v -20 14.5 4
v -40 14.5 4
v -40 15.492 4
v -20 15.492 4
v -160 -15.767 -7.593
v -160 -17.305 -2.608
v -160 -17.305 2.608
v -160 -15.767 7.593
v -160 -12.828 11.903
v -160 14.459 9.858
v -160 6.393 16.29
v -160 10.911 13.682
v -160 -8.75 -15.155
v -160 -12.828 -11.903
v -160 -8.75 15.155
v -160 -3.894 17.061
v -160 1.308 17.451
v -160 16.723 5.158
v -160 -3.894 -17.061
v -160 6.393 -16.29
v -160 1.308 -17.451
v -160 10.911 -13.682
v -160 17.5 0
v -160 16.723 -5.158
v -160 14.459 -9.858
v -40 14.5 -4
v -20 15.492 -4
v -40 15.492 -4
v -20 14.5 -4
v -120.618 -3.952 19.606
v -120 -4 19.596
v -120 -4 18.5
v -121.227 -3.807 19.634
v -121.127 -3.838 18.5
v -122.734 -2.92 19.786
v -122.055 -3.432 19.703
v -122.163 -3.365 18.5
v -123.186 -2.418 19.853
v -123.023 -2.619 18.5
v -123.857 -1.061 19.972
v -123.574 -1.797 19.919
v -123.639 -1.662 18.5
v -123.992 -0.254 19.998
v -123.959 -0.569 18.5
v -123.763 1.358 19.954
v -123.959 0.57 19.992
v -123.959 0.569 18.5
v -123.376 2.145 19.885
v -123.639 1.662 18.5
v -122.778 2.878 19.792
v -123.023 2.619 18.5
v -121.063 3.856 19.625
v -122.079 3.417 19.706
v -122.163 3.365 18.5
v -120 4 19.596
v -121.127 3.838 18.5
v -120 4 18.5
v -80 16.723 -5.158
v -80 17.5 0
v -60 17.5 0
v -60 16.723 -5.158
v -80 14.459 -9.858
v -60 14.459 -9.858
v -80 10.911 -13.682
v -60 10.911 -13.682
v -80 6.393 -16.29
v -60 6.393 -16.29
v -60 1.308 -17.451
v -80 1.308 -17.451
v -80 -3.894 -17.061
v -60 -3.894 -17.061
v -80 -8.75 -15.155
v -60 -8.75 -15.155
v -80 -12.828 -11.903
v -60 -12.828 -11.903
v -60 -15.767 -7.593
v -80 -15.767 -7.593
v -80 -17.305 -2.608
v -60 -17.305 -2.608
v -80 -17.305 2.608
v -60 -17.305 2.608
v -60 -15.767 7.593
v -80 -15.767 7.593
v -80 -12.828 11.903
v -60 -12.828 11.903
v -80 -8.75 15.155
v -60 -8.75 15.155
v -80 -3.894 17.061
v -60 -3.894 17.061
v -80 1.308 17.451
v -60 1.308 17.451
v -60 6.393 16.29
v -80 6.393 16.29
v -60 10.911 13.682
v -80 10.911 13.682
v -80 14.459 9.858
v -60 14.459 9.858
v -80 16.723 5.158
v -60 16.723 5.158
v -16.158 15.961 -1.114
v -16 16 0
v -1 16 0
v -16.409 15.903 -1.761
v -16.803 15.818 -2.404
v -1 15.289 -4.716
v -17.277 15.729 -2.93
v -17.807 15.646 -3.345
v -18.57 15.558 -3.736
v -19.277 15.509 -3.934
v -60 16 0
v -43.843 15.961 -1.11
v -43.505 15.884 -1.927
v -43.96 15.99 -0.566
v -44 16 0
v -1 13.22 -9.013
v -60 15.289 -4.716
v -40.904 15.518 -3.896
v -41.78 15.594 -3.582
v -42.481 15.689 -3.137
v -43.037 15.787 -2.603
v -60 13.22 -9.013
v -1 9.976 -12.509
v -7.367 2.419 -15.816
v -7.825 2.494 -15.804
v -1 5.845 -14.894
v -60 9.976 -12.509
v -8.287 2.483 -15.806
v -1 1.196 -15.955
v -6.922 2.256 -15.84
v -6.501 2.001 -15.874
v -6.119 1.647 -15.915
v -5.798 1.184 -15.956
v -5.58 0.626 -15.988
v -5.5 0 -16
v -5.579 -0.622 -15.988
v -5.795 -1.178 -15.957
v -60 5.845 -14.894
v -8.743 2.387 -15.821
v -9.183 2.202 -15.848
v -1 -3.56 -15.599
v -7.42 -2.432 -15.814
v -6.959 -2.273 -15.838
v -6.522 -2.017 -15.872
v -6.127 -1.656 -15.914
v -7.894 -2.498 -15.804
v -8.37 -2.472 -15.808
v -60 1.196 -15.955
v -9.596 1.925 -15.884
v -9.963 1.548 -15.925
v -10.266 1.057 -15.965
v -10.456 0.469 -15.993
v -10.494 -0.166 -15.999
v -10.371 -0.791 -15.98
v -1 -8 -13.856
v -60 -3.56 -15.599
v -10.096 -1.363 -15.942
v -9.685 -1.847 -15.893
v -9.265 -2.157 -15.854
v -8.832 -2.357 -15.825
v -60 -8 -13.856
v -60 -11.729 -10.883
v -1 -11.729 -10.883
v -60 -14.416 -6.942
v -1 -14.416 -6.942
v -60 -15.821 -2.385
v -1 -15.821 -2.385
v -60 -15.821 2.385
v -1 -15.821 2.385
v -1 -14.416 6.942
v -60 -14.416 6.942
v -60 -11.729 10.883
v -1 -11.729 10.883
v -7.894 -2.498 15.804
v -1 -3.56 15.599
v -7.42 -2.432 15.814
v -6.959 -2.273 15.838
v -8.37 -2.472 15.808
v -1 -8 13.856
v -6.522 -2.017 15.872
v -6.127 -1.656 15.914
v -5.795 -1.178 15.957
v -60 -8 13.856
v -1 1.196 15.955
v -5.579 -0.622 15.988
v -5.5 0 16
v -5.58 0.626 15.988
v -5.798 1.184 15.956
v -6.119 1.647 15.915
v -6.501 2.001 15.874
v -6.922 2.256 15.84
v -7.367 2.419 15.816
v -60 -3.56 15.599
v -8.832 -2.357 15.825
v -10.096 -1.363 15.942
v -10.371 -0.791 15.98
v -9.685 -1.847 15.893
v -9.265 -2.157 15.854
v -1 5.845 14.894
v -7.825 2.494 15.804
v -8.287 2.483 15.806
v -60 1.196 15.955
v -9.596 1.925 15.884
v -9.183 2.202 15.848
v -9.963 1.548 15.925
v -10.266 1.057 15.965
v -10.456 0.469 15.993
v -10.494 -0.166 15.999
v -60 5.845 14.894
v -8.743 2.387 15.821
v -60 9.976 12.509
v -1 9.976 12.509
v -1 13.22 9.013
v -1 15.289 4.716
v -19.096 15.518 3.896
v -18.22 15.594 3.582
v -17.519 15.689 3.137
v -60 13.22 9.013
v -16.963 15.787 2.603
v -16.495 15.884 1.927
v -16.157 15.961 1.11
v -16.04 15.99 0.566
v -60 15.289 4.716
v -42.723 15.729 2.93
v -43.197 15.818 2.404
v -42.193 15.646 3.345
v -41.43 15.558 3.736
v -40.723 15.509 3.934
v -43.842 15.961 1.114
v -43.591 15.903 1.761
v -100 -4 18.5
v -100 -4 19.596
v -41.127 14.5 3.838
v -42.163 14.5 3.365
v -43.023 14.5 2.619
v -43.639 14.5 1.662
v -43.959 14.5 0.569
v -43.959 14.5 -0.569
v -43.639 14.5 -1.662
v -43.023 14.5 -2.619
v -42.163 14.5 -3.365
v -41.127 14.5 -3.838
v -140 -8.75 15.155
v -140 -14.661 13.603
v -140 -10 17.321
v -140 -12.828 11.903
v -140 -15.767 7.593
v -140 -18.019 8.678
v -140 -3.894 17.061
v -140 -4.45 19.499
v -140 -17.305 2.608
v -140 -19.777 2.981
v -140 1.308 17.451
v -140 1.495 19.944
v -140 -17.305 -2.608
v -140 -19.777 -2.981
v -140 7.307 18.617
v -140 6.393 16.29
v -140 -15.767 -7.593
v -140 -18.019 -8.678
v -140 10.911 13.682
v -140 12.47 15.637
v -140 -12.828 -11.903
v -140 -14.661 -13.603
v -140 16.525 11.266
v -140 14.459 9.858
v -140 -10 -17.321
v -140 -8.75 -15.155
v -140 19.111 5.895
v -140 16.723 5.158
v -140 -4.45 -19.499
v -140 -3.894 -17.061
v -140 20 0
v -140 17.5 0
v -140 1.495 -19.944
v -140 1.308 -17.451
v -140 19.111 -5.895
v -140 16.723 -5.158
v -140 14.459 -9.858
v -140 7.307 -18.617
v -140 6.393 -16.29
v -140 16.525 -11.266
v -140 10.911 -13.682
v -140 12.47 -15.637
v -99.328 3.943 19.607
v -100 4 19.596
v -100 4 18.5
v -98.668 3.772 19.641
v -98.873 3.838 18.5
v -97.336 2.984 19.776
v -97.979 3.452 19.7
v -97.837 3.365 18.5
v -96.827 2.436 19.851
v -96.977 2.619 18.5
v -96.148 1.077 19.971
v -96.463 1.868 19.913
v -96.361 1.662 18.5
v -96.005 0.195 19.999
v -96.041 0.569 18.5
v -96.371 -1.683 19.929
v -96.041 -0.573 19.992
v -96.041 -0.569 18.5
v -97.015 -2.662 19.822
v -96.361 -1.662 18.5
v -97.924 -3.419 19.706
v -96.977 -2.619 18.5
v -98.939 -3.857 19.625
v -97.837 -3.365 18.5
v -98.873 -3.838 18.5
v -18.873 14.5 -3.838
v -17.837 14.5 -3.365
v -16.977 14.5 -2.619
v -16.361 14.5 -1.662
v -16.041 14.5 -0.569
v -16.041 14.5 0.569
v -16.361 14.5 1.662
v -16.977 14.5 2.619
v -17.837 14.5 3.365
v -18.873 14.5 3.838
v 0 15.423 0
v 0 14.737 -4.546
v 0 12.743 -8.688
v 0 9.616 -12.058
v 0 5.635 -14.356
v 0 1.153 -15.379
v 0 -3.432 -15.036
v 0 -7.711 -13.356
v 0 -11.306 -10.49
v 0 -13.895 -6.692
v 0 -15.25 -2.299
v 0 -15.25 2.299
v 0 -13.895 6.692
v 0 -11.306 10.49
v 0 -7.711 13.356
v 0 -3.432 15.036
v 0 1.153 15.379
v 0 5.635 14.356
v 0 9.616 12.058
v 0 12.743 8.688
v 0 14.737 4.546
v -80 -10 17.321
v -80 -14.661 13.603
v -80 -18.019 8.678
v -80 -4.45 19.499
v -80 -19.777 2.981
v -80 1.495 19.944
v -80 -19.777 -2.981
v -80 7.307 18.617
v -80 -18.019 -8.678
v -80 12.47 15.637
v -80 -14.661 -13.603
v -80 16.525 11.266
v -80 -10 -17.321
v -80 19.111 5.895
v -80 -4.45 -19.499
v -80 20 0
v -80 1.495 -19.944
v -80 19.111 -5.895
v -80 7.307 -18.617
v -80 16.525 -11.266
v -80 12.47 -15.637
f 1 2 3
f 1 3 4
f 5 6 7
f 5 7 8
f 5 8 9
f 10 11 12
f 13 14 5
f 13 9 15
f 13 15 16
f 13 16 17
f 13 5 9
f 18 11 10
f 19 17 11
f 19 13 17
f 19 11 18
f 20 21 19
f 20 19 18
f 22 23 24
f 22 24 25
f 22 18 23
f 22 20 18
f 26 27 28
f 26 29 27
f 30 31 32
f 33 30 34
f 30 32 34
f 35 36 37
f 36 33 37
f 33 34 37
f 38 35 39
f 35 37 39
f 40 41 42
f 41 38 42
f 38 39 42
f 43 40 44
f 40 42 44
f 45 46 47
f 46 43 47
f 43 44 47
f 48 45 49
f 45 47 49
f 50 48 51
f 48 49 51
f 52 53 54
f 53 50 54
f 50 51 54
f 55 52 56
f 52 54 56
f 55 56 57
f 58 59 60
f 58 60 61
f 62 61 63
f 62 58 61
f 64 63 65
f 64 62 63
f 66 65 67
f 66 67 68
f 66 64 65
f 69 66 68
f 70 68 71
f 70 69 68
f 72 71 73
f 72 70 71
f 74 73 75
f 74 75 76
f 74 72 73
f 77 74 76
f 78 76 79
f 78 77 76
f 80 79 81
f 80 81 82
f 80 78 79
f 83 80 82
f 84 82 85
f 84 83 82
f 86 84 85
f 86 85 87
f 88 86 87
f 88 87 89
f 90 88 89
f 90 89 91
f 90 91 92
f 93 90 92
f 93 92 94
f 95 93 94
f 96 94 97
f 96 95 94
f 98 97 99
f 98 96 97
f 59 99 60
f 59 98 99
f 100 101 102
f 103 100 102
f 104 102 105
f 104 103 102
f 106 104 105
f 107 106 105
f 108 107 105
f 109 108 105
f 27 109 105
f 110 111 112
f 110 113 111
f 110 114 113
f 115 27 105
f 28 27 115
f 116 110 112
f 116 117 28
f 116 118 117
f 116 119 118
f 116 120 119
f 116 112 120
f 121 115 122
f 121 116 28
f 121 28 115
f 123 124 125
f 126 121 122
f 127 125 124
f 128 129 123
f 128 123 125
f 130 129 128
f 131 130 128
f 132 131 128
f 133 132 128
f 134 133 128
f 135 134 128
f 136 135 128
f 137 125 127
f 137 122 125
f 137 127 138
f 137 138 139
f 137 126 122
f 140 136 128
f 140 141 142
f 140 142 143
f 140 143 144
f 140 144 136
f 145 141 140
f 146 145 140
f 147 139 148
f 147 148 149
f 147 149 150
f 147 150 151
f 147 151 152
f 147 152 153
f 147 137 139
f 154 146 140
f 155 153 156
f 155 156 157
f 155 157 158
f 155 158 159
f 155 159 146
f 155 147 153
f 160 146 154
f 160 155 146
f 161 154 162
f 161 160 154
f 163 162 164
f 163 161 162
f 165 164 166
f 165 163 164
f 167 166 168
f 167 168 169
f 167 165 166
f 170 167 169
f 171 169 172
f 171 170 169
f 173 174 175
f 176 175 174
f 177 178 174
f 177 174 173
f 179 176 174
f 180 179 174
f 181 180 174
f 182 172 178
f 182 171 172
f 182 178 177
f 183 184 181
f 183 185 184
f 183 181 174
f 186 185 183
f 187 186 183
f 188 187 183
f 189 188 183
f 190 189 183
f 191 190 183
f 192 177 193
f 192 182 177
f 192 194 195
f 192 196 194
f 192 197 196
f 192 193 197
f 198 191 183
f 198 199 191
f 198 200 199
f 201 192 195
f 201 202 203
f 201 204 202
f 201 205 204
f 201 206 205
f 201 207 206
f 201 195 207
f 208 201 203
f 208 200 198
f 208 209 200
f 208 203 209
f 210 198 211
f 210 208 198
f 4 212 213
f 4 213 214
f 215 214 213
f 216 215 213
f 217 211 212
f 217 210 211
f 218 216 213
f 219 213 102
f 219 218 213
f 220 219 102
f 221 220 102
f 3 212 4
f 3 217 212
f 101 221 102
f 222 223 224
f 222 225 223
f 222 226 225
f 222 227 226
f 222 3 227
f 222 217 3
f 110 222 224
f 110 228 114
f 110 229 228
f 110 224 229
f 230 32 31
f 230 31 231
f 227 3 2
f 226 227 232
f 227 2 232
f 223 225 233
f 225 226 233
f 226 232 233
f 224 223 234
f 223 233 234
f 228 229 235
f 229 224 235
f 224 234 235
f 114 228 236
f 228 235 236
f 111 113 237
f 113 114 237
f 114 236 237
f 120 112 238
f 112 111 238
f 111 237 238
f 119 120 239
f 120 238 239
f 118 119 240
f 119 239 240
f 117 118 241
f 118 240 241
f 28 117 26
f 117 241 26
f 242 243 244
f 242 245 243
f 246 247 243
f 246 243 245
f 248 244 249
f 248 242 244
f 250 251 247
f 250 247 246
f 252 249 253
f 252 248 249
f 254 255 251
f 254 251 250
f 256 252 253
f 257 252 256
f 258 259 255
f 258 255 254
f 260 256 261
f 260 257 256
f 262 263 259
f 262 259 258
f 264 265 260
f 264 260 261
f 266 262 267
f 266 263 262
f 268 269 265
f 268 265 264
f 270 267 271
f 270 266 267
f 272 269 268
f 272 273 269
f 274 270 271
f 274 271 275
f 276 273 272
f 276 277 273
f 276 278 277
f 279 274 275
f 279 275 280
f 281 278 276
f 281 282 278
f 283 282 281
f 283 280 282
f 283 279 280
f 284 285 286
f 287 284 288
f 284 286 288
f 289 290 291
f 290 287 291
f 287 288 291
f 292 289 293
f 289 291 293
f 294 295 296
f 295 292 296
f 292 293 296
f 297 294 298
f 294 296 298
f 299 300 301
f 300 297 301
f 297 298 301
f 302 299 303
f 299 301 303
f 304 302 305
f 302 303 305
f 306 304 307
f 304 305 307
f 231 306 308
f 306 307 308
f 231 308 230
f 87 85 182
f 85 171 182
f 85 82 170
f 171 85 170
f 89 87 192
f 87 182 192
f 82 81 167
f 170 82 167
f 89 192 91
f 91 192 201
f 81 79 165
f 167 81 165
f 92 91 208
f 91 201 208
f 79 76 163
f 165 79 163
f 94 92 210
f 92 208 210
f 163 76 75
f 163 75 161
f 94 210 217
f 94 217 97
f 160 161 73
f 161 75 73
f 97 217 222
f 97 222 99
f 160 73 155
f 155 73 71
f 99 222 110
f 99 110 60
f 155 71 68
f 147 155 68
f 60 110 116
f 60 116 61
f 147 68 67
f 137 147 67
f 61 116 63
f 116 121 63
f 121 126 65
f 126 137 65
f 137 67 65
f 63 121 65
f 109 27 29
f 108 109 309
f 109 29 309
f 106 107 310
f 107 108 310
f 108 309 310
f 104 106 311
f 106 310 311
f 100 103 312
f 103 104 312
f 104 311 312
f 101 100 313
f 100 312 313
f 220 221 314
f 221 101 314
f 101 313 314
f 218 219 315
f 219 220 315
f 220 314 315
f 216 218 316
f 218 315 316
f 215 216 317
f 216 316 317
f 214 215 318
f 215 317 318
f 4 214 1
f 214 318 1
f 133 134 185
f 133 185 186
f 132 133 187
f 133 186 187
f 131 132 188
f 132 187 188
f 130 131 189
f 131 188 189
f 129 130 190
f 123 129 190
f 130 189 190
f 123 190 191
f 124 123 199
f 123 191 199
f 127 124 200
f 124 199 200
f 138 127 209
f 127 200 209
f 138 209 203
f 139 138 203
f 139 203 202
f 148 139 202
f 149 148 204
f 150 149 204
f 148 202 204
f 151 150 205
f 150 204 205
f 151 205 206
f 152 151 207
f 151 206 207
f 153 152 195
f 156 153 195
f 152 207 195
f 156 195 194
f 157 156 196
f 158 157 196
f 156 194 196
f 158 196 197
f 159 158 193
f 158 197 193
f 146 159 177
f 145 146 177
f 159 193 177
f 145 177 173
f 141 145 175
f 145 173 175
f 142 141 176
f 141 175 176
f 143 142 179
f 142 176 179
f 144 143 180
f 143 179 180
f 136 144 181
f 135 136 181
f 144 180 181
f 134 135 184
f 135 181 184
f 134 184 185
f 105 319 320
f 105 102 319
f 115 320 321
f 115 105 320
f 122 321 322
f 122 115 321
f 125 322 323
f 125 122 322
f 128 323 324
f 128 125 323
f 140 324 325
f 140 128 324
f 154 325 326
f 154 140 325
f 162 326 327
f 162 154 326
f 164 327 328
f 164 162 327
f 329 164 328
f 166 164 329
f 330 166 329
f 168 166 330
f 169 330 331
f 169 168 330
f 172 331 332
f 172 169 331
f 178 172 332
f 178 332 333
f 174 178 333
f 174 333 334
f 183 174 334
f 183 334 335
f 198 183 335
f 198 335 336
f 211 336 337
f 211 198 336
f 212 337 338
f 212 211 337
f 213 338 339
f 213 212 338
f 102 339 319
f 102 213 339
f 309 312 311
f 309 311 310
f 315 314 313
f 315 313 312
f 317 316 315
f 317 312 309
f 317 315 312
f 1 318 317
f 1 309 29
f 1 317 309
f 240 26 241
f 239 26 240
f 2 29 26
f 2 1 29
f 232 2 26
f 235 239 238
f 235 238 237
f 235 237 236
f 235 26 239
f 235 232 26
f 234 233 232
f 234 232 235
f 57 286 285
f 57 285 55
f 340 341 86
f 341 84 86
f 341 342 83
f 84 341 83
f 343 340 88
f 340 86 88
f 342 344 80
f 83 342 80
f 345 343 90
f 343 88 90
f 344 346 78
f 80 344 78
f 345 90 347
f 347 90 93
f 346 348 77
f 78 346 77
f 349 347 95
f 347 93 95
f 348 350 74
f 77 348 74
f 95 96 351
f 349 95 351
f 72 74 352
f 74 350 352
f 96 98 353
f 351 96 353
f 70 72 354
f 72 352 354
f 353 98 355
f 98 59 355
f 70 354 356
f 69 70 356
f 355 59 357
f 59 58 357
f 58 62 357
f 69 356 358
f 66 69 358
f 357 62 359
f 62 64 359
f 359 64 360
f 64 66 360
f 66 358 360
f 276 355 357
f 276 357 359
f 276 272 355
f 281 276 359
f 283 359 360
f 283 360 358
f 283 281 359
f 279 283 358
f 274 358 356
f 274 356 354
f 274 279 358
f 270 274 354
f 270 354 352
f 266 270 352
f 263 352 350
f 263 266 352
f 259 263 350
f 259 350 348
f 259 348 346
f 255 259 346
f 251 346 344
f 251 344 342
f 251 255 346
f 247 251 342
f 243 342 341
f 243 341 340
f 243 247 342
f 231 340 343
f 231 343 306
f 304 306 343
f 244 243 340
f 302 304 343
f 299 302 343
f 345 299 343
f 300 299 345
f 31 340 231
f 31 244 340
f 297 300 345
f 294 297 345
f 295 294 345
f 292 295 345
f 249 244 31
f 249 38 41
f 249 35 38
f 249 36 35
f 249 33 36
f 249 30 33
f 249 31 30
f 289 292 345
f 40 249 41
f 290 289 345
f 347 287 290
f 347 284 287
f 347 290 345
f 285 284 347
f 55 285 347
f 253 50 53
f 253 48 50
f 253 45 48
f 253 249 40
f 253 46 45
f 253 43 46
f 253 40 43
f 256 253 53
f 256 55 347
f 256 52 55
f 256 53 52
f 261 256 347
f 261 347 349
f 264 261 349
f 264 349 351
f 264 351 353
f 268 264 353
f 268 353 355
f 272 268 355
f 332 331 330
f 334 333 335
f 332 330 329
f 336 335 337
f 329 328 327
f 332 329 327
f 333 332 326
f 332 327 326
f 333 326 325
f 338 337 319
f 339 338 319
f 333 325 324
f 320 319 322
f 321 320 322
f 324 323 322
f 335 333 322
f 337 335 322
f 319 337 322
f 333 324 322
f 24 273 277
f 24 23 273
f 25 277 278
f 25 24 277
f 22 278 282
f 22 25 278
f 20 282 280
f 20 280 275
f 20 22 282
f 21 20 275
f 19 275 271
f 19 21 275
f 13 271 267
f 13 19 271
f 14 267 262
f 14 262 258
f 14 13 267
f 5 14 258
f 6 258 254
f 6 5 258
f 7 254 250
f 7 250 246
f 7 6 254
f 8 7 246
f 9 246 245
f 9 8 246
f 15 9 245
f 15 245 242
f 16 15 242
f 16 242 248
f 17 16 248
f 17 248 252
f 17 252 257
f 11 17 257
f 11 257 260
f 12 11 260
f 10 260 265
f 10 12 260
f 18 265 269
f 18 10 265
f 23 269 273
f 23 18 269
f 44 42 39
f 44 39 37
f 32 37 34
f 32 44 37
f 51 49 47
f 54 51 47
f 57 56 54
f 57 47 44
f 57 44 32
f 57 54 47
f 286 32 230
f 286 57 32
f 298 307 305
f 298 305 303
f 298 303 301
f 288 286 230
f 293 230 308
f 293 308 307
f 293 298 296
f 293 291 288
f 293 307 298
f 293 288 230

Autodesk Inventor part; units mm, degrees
ref_plane "YZ Plane" through (0, 0, 0) normal (1, 0, 0) x (0, 1, 0)
sketch "Эскиз1" plane through (0, 0, 0) normal (0, 0, 1) x (1, 0, 0)
  line L0 (0, 0) -> (-160, 0)
  line L1 (0, 0) -> (0, 15.4226)
  line L2 (0, 15.4226) -> (-1, 16)
  line L3 (-1, 16) -> (-60, 16)
  line L4 (-60, 16) -> (-60, 17.5)
  line L5 (-60, 17.5) -> (-80, 17.5)
  line L6 (-80, 17.5) -> (-80, 20)
  line L7 (-80, 20) -> (-140, 20)
  line L8 (-140, 20) -> (-140, 17.5)
  line L9 (-140, 17.5) -> (-160, 17.5)
  line L10 (-160, 17.5) -> (-160, 0)
  dimension "d0" = 160
  dimension "d1" = 32
  dimension "d2" = 30
  dimension "d3" = 1
  dimension "d4" = 60
  dimension "d5" = 35
  dimension "d6" = 20
  dimension "d7" = 40
revolve "Вращение1" add sketch "Эскиз1" angle 360 about axis through (0, 0, 0) along (-1, 0, 0)
ref_plane "РабПлоскость1" through (0, 14.5, 0) normal (0, 1, 0) x (-1, 0, 0)
ref_plane "РабПлоскость2" through (0, 0, 18.5) normal (0, 0, 1) x (1, 0, 0)
sketch "Эскиз3" plane through (0, 14.5, 0) normal (0, 1, 0) x (-1, 0, 0)
  line L0 (0, 15.4226) -> (0, -15.4226) projected
  line L1 (80, 20) -> (80, -20) projected
  line L2 (140, 20) -> (140, -20) projected
  line L3 (44, 0) -> (16, 0) construction
  line L4 (40, 4) -> (20, 4)
  line L5 (20, -4) -> (40, -4)
  arc A0 (40, -4) -> (40, 4) centre (40, 0) ccw
  arc A1 (20, 4) -> (20, -4) centre (20, 0) ccw
  point P0 (0, 0)
  point P1 (30, 0)
  point P2 (80, 0)
  dimension "d11" = 20
  dimension "d12" = 8
  dimension "d13" = 50
extrude "Выдавливание1" cut sketch "Эскиз3" along normal through all
sketch "Эскиз4" plane through (0, 0, 18.5) normal (0, 0, 1) x (1, 0, 0)
  line L0 (-124, 0) -> (-96, 0) construction
  line L1 (-120, -4) -> (-100, -4)
  line L2 (-100, 4) -> (-120, 4)
  arc A0 (-120, 4) -> (-120, -4) centre (-120, 0) ccw
  arc A1 (-100, -4) -> (-100, 4) centre (-100, 0) ccw
  line L3 (-80, -17.5) -> (-80, 17.5) projected
  point P0 (0, 0)
  point P1 (-110, 0)
  point P2 (-80, 0)
  dimension "d16" = 20
  dimension "d17" = 8
  dimension "d18" = 30
extrude "Выдавливание2" cut sketch "Эскиз4" along normal through all
sketch "Эскиз6" plane through (0, 0, 18.5) normal (0, 0, 1) x (1, 0, 0)
  circle A0 centre (-8, 0) radius 2.5
  point P0 (0, 0)
  dimension "d21" = 5
  dimension "d22" = 8
extrude "Выдавливание3" cut sketch "Эскиз6" against normal through all
properties part number "Shaft2"
